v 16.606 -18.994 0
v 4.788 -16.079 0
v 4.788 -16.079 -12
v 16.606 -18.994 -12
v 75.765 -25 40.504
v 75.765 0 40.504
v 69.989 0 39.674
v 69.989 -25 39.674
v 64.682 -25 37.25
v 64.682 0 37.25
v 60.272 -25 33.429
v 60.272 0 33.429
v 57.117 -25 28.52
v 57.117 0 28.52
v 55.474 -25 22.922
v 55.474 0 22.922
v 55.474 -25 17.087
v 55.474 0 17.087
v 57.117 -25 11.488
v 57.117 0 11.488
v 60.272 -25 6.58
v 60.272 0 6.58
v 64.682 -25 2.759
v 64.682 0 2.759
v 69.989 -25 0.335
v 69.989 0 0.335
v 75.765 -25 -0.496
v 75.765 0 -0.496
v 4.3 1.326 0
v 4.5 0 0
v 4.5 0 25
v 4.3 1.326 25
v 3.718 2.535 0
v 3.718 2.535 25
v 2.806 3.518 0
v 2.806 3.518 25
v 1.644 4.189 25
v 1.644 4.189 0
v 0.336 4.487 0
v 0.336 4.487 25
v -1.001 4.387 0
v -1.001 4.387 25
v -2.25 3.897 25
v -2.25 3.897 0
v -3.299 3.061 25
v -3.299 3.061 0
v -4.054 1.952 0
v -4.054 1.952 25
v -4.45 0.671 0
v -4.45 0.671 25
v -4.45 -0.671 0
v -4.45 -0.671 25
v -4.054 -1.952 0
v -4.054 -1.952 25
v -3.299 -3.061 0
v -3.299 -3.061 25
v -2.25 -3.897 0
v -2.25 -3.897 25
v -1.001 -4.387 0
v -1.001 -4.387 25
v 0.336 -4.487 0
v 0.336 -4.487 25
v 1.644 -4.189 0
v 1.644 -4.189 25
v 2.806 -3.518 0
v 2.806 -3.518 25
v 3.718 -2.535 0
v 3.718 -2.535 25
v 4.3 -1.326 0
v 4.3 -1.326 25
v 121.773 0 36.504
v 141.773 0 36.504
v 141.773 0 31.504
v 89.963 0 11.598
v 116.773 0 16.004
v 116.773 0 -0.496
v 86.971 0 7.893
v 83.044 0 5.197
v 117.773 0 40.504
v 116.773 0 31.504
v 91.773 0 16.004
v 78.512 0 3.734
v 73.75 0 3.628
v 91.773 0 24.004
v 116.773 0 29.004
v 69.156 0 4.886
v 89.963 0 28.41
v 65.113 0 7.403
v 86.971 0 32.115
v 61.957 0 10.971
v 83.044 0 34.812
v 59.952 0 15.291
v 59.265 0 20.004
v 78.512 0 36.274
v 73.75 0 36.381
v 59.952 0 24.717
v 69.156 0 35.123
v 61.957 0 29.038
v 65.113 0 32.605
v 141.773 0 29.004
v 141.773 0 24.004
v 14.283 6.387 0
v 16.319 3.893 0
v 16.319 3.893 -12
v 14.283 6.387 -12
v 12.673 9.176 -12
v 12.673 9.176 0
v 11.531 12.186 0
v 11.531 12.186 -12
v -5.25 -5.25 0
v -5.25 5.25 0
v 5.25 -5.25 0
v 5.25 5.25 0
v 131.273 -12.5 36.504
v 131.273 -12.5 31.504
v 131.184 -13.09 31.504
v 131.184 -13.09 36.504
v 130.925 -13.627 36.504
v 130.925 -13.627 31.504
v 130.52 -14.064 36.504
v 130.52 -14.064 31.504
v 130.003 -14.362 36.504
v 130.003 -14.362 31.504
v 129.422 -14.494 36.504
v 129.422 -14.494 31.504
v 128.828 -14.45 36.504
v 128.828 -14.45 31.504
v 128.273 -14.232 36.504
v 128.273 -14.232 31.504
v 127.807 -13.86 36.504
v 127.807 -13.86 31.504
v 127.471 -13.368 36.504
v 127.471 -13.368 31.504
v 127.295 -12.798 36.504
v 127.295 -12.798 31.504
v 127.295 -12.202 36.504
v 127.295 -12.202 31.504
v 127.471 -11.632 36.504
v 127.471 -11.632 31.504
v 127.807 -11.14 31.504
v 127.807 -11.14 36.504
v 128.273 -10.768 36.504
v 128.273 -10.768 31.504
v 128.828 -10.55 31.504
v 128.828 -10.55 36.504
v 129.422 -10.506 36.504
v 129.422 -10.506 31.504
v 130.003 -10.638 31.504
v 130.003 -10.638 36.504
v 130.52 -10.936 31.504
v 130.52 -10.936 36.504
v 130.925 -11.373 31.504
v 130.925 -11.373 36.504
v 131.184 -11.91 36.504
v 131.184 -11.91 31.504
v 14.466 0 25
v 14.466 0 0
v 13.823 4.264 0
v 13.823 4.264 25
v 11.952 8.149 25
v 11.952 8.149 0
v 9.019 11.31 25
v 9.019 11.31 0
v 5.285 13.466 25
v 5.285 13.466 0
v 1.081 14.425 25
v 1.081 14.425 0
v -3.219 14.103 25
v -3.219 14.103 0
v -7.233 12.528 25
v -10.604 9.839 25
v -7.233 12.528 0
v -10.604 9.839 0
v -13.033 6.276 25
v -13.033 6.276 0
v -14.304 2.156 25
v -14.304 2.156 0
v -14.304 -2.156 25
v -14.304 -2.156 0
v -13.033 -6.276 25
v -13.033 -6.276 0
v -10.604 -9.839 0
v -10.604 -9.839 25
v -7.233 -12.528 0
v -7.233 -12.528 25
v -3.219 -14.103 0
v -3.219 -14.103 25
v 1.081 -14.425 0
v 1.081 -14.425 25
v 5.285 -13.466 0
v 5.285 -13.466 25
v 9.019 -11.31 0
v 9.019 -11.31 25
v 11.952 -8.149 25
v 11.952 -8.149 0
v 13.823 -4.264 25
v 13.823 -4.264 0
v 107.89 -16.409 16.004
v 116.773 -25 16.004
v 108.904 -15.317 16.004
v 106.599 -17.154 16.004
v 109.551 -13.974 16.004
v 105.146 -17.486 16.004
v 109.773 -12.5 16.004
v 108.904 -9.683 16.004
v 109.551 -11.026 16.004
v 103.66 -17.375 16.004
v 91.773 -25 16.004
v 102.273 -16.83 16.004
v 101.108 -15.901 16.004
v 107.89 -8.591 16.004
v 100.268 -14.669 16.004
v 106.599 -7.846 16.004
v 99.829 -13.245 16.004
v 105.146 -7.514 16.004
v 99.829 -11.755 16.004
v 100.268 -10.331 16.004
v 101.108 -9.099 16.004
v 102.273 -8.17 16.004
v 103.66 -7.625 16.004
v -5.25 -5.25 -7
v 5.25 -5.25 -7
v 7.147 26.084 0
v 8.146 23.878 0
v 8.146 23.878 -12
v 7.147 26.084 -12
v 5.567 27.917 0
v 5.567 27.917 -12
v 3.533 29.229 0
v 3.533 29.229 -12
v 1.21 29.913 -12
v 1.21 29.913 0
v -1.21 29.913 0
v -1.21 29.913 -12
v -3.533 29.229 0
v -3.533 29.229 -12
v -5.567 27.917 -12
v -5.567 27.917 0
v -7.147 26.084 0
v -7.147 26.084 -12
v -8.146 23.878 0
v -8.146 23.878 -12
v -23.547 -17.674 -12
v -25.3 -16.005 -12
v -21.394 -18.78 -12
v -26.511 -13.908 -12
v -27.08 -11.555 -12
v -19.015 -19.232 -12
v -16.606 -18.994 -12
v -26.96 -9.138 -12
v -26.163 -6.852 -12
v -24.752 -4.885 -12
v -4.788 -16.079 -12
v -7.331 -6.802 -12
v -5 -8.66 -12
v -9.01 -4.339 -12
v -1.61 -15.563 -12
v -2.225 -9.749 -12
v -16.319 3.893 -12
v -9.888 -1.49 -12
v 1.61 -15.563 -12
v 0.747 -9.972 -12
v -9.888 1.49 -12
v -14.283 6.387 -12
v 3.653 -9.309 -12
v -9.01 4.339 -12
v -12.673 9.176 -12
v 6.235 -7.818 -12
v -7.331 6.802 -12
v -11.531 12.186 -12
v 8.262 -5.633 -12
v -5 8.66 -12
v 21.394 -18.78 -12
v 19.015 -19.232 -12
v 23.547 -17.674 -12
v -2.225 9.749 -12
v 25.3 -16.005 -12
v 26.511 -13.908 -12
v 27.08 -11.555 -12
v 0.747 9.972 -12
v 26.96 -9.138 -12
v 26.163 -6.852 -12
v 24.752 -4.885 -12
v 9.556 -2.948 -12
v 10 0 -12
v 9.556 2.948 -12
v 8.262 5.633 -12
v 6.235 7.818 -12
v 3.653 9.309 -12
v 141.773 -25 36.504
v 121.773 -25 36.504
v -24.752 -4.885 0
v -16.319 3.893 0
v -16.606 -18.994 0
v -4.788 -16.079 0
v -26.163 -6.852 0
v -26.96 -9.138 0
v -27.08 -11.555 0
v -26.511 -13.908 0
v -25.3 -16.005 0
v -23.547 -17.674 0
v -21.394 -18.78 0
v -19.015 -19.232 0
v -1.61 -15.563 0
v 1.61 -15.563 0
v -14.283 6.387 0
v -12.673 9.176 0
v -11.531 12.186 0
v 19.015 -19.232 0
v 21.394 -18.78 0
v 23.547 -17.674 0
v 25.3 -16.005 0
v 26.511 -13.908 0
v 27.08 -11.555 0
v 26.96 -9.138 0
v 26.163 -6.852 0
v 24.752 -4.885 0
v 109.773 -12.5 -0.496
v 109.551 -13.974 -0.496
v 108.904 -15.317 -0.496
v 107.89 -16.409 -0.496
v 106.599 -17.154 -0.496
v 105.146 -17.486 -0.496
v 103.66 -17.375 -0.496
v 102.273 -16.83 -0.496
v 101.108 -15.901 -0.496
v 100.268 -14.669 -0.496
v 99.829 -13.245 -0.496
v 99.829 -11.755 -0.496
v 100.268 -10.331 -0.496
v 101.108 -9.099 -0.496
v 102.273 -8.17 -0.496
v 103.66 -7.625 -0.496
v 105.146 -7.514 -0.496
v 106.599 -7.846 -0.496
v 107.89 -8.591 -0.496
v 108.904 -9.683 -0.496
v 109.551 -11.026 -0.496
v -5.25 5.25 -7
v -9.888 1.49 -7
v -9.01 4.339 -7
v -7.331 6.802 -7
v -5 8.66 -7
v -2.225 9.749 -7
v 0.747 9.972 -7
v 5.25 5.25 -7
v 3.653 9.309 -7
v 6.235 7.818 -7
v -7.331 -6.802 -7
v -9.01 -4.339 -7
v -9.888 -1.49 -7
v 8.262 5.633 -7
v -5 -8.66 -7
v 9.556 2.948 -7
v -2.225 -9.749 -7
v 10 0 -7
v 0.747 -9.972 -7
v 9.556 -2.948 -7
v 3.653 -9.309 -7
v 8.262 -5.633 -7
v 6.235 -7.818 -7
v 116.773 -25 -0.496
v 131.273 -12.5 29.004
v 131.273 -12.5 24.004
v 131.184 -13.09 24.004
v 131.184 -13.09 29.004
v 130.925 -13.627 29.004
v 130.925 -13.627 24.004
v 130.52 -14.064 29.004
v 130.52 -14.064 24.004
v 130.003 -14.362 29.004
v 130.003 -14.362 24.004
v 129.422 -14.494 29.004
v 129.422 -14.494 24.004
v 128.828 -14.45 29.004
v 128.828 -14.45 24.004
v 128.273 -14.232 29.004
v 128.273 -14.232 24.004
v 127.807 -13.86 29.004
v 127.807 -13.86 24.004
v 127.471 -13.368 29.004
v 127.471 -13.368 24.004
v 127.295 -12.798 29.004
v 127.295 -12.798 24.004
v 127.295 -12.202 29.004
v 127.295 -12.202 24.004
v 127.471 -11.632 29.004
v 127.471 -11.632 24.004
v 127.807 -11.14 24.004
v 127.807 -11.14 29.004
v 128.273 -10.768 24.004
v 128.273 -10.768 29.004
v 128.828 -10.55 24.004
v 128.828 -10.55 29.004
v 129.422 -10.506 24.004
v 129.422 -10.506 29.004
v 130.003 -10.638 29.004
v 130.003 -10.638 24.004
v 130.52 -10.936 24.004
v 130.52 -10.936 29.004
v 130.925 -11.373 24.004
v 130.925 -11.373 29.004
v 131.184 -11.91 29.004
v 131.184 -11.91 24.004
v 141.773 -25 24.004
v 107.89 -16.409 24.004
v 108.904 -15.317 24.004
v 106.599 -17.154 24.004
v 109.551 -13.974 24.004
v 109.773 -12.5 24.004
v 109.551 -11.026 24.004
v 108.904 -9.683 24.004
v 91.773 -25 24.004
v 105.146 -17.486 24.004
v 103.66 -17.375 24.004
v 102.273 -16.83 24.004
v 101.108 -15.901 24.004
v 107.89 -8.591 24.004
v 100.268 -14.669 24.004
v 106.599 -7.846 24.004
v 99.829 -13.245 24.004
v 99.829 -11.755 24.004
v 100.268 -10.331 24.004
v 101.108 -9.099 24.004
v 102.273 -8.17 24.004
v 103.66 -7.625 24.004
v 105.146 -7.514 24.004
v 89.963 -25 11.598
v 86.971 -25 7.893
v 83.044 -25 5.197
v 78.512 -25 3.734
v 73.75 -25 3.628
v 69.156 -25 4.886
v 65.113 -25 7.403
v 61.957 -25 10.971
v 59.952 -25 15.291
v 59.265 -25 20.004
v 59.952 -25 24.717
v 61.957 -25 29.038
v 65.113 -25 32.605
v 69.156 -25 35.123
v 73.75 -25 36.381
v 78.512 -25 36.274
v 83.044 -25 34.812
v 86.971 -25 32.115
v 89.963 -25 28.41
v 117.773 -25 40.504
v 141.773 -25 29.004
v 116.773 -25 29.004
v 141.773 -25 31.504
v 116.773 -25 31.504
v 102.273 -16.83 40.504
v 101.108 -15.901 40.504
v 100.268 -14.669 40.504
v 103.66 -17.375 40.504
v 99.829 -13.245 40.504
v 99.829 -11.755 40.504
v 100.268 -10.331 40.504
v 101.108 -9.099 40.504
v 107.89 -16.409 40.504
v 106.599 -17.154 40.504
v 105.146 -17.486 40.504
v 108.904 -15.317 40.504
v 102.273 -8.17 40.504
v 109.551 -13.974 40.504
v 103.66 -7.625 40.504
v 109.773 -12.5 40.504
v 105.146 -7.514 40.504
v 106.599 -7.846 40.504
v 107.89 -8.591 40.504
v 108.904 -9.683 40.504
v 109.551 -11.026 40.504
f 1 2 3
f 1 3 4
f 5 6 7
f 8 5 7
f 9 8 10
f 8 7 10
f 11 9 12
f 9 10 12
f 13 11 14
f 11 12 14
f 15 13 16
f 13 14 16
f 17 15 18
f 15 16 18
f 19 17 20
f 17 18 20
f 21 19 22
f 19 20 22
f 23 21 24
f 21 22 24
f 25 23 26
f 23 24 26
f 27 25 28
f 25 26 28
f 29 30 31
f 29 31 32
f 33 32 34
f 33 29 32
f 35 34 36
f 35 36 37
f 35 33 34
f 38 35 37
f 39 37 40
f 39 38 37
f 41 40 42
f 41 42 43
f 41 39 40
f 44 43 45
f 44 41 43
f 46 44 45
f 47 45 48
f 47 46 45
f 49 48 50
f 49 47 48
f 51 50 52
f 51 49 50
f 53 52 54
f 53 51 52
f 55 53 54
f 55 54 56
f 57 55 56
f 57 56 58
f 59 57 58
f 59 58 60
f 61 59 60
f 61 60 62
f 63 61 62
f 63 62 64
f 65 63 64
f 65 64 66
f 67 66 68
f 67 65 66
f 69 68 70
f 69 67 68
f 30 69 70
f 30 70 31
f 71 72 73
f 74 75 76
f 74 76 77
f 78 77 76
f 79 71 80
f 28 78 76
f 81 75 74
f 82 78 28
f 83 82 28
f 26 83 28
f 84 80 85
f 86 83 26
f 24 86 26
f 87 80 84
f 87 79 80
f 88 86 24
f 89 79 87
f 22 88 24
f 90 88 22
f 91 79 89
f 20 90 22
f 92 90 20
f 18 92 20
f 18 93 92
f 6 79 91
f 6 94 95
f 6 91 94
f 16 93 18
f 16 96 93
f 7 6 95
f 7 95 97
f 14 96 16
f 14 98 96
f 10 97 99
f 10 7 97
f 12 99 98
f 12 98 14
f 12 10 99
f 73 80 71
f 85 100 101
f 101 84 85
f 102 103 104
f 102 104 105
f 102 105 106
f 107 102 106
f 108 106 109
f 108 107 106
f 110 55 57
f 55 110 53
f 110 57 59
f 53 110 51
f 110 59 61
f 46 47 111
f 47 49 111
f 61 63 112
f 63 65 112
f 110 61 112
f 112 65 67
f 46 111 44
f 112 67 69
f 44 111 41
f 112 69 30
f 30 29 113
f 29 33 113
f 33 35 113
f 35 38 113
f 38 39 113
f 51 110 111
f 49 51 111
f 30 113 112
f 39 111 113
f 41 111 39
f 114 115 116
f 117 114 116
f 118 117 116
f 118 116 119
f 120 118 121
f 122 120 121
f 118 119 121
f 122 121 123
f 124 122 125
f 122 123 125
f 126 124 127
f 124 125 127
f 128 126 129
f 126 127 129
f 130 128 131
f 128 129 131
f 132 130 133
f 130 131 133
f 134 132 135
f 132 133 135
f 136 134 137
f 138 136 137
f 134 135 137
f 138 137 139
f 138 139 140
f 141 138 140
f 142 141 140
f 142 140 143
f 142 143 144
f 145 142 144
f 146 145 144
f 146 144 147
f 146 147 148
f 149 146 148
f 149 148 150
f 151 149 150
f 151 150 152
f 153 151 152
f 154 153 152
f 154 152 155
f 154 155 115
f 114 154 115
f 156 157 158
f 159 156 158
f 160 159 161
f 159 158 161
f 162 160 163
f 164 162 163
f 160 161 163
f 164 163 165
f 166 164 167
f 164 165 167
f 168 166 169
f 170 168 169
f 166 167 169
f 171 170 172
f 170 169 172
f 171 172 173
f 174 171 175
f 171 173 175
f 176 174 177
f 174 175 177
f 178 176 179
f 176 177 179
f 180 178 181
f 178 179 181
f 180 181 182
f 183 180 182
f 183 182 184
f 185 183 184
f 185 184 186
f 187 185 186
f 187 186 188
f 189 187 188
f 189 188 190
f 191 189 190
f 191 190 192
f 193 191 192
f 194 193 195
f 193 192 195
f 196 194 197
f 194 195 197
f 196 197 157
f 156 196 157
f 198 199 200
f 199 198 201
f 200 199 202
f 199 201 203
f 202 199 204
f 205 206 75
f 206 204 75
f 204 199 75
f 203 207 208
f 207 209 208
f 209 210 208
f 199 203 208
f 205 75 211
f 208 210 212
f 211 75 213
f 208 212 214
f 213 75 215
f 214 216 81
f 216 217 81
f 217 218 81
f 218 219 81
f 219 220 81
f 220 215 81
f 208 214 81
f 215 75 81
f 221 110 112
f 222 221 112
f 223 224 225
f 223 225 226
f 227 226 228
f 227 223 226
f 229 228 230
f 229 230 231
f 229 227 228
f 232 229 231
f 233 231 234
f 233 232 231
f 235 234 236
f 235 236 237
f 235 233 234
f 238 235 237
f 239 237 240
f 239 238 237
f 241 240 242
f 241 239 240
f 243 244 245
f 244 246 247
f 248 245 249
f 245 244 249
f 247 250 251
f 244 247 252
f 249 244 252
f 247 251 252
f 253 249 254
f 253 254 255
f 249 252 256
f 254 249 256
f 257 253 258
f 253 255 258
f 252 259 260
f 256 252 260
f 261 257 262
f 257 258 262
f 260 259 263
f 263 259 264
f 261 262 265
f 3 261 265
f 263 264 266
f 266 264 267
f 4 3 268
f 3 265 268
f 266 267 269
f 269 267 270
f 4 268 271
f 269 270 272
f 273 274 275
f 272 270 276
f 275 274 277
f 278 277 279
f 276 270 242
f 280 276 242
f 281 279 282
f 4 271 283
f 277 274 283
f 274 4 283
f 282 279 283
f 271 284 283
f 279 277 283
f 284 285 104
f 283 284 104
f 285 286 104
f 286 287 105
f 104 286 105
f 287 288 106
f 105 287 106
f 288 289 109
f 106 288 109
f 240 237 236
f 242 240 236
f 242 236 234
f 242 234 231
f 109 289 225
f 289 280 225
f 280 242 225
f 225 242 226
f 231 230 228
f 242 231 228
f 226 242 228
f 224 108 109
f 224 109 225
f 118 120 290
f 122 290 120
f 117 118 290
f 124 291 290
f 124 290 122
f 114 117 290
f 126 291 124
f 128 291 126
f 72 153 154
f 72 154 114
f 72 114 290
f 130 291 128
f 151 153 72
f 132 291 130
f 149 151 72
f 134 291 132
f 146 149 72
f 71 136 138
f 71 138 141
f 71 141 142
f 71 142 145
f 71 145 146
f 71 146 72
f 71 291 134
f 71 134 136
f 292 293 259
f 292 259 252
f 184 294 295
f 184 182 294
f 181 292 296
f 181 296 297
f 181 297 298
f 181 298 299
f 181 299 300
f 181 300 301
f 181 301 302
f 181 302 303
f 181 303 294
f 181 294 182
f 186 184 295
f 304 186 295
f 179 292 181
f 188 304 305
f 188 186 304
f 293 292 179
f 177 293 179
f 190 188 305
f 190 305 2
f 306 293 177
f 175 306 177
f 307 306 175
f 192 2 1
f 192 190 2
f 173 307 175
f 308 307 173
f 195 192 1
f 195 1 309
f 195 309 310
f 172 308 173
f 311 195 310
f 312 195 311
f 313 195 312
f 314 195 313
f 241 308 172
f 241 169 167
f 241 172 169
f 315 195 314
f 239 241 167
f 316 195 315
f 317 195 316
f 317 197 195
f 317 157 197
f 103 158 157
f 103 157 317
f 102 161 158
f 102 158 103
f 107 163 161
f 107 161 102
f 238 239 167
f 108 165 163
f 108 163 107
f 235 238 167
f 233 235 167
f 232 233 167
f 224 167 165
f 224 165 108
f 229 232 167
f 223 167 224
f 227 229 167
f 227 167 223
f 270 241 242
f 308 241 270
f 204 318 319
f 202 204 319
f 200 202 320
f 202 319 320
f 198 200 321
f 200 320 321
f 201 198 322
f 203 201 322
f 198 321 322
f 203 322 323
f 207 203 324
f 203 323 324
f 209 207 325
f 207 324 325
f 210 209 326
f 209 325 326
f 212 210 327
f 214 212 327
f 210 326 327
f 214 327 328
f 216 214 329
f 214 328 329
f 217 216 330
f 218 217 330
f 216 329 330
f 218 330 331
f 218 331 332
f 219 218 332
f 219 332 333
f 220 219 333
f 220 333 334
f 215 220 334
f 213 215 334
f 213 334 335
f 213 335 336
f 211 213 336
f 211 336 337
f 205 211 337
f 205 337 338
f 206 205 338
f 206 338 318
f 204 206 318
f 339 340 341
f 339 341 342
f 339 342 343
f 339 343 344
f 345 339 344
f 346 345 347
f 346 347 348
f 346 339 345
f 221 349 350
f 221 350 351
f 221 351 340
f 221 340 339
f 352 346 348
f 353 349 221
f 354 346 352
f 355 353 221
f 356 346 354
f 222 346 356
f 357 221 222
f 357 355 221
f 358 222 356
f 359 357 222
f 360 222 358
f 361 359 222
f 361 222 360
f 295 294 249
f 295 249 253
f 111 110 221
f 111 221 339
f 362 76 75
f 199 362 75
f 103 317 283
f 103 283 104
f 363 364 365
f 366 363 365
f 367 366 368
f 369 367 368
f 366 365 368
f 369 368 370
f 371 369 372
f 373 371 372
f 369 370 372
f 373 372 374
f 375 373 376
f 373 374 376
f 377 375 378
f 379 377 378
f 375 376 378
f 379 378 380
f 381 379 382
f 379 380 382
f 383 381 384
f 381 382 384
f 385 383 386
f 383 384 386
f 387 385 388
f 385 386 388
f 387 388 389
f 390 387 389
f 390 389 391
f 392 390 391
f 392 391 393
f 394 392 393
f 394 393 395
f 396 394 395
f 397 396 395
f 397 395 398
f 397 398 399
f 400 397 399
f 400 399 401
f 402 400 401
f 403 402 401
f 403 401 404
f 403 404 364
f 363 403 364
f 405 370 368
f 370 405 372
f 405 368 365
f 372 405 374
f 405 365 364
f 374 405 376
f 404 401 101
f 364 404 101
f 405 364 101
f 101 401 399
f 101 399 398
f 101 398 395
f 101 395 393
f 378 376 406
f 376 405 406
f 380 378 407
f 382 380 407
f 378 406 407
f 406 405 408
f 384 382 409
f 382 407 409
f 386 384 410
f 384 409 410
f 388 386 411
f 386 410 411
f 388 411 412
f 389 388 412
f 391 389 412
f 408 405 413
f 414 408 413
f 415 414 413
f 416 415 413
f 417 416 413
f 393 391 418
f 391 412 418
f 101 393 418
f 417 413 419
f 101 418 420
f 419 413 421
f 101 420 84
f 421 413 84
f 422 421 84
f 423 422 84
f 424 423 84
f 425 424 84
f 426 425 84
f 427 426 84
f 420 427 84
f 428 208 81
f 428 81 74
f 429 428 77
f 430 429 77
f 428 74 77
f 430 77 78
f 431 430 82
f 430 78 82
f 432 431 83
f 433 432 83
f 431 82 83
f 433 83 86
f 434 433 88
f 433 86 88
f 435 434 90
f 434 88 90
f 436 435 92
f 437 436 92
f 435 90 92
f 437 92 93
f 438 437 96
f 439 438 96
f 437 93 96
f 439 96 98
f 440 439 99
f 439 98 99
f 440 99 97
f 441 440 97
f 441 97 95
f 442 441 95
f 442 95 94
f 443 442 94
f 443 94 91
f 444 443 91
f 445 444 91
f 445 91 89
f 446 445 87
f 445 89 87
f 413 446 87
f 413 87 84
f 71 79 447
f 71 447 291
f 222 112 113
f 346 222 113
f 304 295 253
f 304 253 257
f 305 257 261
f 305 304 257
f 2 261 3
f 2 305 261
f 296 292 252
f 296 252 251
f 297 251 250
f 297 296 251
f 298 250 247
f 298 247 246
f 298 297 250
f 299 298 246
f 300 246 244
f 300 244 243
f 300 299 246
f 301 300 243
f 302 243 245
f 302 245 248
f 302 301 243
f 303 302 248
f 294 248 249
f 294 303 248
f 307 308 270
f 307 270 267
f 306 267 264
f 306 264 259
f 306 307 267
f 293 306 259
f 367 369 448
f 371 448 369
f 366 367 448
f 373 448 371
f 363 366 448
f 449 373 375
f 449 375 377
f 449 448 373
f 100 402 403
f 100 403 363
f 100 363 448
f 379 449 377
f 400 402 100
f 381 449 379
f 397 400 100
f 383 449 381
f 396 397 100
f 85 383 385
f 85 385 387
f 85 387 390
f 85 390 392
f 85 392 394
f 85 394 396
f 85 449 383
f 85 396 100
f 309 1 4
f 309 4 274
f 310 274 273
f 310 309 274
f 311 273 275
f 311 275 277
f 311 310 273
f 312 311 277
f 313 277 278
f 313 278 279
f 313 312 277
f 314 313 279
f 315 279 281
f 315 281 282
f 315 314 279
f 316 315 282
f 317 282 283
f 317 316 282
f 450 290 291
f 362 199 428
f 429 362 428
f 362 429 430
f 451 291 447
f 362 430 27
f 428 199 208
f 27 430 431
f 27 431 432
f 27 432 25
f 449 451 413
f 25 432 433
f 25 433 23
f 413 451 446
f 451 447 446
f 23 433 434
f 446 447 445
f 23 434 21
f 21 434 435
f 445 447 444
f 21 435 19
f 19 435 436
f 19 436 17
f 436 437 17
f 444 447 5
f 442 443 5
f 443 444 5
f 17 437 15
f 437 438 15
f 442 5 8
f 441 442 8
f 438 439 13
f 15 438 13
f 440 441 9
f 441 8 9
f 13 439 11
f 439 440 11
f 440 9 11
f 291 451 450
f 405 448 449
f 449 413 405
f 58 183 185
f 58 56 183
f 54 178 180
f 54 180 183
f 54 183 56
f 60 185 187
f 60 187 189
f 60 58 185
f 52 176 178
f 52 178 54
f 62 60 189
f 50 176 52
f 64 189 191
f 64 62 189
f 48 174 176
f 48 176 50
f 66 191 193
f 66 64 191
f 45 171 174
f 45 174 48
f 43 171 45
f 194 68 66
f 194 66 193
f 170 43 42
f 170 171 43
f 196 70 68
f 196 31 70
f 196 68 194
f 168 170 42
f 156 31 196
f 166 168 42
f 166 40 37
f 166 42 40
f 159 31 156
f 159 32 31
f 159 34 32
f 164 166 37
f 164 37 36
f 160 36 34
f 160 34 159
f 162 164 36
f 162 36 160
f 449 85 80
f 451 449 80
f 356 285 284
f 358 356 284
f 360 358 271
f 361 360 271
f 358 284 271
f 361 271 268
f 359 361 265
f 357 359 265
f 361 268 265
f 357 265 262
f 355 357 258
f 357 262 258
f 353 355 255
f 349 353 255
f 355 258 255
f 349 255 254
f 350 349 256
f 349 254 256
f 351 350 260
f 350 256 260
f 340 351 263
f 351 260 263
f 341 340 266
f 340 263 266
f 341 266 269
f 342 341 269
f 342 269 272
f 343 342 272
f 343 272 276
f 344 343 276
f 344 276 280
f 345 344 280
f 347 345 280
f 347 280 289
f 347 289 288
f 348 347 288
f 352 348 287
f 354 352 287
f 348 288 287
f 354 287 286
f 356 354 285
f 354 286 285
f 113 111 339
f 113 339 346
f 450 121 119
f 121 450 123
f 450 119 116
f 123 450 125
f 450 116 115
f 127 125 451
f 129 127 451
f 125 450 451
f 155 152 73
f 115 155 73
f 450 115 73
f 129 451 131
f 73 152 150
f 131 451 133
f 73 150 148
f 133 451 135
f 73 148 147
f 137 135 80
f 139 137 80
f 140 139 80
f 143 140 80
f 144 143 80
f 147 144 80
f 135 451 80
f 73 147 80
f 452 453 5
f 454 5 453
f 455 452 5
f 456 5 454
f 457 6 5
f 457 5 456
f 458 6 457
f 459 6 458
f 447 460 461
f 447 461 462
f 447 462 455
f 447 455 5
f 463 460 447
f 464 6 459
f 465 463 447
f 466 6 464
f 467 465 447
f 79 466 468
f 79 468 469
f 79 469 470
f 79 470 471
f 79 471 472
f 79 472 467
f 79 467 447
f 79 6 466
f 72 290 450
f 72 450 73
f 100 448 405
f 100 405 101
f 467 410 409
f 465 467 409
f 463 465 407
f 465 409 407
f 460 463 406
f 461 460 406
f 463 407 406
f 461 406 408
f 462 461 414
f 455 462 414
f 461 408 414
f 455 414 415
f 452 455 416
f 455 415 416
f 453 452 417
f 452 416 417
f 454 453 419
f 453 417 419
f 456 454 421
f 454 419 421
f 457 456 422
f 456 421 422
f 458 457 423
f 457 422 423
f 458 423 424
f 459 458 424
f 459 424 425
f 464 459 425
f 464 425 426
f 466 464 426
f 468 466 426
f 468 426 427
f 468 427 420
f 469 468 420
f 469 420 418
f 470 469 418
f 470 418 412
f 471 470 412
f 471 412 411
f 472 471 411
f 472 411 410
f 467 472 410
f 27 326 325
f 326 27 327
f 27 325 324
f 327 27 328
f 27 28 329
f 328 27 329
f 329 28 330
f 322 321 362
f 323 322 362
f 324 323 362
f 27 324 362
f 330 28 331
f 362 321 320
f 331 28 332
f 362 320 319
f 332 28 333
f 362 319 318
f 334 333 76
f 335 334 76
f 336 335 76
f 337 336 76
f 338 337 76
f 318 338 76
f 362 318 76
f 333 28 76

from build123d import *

# Parameters (mm, degrees)
F0_R        = 14.4655577075
F0_W        = 10.5
F0_H        = 10.5
F1_DEPTH    = 12
F0_R_2      = 4.5
F2_DEPTH    = 25
F3_R        = 10
F3_W        = 10.5
F3_H        = 10.5
F4_DEPTH    = 5
F6_DEPTH    = 25
F7_W        = 25
F7_H        = 5
F8_DEPTH    = 25
F9_T4_DEPTH = 25
F10_R       = 5
F10_R_2     = 2
F11_DEPTH   = 41.001


# Not quite as in the source:
# - a fillet or chamfer that OpenCascade refuses, or shapes differently, is made with other operations: its cross-section is extruded or revolved along the edge and cut away or added


with BuildPart() as f1:
    # F0 (on Top) → F1 (new body)
    with BuildSketch(Plane.XY):
        with BuildLine():
            Line((11.5311605337, 12.1863566004), (8.1457248267, 23.8782938791))
            ThreePointArc((8.1457248267, 23.8782938791), (0, 30), (-8.1457248267, 23.8782938791))
            Line((-8.1457248267, 23.8782938791), (-11.5311605337, 12.1863566004))
            ThreePointArc((-11.5311605337, 12.1863566004), (-13.4215306345, 7.7489243248), (-16.3192746623, 3.8930996571))
            Line((-16.3192746623, 3.8930996571), (-24.7520715117, -4.8847423074))
            ThreePointArc((-24.7520715117, -4.8847423074), (-25.9807621135, -15), (-16.606346685, -18.9935515717))
            Line((-16.606346685, -18.9935515717), (-4.7881141286, -16.0794562575))
            ThreePointArc((-4.7881141286, -16.0794562575), (0, -15.4978486495), (4.7881141286, -16.0794562575))
            Line((4.7881141286, -16.0794562575), (16.606346685, -18.9935515717))
            ThreePointArc((16.606346685, -18.9935515717), (25.9807621135, -15), (24.7520715117, -4.8847423074))
            Line((24.7520715117, -4.8847423074), (16.3192746623, 3.8930996571))
            ThreePointArc((16.3192746623, 3.8930996571), (13.4215306345, 7.7489243248), (11.5311605337, 12.1863566004))
        make_face()
        Circle(F0_R, mode=Mode.SUBTRACT)
        Circle(F0_R)
        Rectangle(F0_W, F0_H, mode=Mode.SUBTRACT)
    extrude(amount=-F1_DEPTH)

    # F0 (on Top) → F2 (join)
    with BuildSketch(Plane.XY):
        Circle(F0_R)
        Rectangle(F0_W, F0_H, mode=Mode.SUBTRACT)
        Rectangle(F0_W, F0_H)
        Circle(F0_R_2, mode=Mode.SUBTRACT)
    extrude(amount=F2_DEPTH)

    # F3 (on face) → F4 (cut)
    with BuildSketch(Plane(origin=(0, 0, -12), x_dir=(1, 0, 0), z_dir=(0, 0, -1))):
        Circle(F3_R)
        Rectangle(F3_W, F3_H, mode=Mode.SUBTRACT)
    extrude(amount=-F4_DEPTH, mode=Mode.SUBTRACT)


with BuildPart() as f6:
    # F5 (on Front) → F6 (new body)
    with BuildSketch(Plane.XZ):
        with BuildLine():
            ThreePointArc((91.7727594808, 16.0042379603), (59.2649488872, 20.0042379603), (91.7727594808, 24.0042379603))
            Line((91.7727594808, 24.0042379603), (116.7727594808, 24.0042379603))
            Line((116.7727594808, 24.0042379603), (116.7727594808, 40.5042379603))
            Line((116.7727594808, 40.5042379603), (75.7649488872, 40.5042379603))
            ThreePointArc((75.7649488872, 40.5042379603), (55.2649488872, 20.0042379603), (75.7649488872, -0.4957620397))
            Line((75.7649488872, -0.4957620397), (116.7727594808, -0.4957620397))
            Line((116.7727594808, -0.4957620397), (116.7727594808, 16.0042379603))
            Line((116.7727594808, 16.0042379603), (91.7727594808, 16.0042379603))
        make_face()
    extrude(amount=F6_DEPTH)

    # F7 (on face) → F8 (join)
    with BuildSketch(Plane.YZ.offset(116.7727594808)):
        with Locations((-12.5, 26.5042379603)):
            Rectangle(F7_W, F7_H)
        with Locations((-12.5, 34.0042379603)):
            Rectangle(F7_W, F7_H)
    extrude(amount=F8_DEPTH)

    # F9: chamfer of 5 on 1 edges, made by hand


with BuildPart() as f9_tool2:
    # F9_s3 → F9_t4 (new body)
    with BuildSketch(Plane.XZ):
        Polygon((116.7727594808, 41.5042379603), (121.7727594808, 36.5042379603), (116.7727594808, 36.5042379603), align=None)
    extrude(amount=F9_T4_DEPTH)

    split(bisect_by=Plane.XY.offset(40.5042379603), keep=Keep.BOTTOM)


with BuildPart() as f6_1:
    add(f6.part)

    # F9_t1: union F9_tool2
    add(f9_tool2.part)

    # F10 (on face) → F11 (cut, through all)
    with BuildSketch(Plane(origin=(0, 0, -0.4957620397), x_dir=(1, 0, 0), z_dir=(0, 0, -1))):
        with Locations((104.7727594808, 12.5)):
            Circle(F10_R)
        with Locations((129.2727594808, 12.5)):
            Circle(F10_R_2)
    extrude(amount=-F11_DEPTH, mode=Mode.SUBTRACT)


solid = Compound([f1.part, f6_1.part])
